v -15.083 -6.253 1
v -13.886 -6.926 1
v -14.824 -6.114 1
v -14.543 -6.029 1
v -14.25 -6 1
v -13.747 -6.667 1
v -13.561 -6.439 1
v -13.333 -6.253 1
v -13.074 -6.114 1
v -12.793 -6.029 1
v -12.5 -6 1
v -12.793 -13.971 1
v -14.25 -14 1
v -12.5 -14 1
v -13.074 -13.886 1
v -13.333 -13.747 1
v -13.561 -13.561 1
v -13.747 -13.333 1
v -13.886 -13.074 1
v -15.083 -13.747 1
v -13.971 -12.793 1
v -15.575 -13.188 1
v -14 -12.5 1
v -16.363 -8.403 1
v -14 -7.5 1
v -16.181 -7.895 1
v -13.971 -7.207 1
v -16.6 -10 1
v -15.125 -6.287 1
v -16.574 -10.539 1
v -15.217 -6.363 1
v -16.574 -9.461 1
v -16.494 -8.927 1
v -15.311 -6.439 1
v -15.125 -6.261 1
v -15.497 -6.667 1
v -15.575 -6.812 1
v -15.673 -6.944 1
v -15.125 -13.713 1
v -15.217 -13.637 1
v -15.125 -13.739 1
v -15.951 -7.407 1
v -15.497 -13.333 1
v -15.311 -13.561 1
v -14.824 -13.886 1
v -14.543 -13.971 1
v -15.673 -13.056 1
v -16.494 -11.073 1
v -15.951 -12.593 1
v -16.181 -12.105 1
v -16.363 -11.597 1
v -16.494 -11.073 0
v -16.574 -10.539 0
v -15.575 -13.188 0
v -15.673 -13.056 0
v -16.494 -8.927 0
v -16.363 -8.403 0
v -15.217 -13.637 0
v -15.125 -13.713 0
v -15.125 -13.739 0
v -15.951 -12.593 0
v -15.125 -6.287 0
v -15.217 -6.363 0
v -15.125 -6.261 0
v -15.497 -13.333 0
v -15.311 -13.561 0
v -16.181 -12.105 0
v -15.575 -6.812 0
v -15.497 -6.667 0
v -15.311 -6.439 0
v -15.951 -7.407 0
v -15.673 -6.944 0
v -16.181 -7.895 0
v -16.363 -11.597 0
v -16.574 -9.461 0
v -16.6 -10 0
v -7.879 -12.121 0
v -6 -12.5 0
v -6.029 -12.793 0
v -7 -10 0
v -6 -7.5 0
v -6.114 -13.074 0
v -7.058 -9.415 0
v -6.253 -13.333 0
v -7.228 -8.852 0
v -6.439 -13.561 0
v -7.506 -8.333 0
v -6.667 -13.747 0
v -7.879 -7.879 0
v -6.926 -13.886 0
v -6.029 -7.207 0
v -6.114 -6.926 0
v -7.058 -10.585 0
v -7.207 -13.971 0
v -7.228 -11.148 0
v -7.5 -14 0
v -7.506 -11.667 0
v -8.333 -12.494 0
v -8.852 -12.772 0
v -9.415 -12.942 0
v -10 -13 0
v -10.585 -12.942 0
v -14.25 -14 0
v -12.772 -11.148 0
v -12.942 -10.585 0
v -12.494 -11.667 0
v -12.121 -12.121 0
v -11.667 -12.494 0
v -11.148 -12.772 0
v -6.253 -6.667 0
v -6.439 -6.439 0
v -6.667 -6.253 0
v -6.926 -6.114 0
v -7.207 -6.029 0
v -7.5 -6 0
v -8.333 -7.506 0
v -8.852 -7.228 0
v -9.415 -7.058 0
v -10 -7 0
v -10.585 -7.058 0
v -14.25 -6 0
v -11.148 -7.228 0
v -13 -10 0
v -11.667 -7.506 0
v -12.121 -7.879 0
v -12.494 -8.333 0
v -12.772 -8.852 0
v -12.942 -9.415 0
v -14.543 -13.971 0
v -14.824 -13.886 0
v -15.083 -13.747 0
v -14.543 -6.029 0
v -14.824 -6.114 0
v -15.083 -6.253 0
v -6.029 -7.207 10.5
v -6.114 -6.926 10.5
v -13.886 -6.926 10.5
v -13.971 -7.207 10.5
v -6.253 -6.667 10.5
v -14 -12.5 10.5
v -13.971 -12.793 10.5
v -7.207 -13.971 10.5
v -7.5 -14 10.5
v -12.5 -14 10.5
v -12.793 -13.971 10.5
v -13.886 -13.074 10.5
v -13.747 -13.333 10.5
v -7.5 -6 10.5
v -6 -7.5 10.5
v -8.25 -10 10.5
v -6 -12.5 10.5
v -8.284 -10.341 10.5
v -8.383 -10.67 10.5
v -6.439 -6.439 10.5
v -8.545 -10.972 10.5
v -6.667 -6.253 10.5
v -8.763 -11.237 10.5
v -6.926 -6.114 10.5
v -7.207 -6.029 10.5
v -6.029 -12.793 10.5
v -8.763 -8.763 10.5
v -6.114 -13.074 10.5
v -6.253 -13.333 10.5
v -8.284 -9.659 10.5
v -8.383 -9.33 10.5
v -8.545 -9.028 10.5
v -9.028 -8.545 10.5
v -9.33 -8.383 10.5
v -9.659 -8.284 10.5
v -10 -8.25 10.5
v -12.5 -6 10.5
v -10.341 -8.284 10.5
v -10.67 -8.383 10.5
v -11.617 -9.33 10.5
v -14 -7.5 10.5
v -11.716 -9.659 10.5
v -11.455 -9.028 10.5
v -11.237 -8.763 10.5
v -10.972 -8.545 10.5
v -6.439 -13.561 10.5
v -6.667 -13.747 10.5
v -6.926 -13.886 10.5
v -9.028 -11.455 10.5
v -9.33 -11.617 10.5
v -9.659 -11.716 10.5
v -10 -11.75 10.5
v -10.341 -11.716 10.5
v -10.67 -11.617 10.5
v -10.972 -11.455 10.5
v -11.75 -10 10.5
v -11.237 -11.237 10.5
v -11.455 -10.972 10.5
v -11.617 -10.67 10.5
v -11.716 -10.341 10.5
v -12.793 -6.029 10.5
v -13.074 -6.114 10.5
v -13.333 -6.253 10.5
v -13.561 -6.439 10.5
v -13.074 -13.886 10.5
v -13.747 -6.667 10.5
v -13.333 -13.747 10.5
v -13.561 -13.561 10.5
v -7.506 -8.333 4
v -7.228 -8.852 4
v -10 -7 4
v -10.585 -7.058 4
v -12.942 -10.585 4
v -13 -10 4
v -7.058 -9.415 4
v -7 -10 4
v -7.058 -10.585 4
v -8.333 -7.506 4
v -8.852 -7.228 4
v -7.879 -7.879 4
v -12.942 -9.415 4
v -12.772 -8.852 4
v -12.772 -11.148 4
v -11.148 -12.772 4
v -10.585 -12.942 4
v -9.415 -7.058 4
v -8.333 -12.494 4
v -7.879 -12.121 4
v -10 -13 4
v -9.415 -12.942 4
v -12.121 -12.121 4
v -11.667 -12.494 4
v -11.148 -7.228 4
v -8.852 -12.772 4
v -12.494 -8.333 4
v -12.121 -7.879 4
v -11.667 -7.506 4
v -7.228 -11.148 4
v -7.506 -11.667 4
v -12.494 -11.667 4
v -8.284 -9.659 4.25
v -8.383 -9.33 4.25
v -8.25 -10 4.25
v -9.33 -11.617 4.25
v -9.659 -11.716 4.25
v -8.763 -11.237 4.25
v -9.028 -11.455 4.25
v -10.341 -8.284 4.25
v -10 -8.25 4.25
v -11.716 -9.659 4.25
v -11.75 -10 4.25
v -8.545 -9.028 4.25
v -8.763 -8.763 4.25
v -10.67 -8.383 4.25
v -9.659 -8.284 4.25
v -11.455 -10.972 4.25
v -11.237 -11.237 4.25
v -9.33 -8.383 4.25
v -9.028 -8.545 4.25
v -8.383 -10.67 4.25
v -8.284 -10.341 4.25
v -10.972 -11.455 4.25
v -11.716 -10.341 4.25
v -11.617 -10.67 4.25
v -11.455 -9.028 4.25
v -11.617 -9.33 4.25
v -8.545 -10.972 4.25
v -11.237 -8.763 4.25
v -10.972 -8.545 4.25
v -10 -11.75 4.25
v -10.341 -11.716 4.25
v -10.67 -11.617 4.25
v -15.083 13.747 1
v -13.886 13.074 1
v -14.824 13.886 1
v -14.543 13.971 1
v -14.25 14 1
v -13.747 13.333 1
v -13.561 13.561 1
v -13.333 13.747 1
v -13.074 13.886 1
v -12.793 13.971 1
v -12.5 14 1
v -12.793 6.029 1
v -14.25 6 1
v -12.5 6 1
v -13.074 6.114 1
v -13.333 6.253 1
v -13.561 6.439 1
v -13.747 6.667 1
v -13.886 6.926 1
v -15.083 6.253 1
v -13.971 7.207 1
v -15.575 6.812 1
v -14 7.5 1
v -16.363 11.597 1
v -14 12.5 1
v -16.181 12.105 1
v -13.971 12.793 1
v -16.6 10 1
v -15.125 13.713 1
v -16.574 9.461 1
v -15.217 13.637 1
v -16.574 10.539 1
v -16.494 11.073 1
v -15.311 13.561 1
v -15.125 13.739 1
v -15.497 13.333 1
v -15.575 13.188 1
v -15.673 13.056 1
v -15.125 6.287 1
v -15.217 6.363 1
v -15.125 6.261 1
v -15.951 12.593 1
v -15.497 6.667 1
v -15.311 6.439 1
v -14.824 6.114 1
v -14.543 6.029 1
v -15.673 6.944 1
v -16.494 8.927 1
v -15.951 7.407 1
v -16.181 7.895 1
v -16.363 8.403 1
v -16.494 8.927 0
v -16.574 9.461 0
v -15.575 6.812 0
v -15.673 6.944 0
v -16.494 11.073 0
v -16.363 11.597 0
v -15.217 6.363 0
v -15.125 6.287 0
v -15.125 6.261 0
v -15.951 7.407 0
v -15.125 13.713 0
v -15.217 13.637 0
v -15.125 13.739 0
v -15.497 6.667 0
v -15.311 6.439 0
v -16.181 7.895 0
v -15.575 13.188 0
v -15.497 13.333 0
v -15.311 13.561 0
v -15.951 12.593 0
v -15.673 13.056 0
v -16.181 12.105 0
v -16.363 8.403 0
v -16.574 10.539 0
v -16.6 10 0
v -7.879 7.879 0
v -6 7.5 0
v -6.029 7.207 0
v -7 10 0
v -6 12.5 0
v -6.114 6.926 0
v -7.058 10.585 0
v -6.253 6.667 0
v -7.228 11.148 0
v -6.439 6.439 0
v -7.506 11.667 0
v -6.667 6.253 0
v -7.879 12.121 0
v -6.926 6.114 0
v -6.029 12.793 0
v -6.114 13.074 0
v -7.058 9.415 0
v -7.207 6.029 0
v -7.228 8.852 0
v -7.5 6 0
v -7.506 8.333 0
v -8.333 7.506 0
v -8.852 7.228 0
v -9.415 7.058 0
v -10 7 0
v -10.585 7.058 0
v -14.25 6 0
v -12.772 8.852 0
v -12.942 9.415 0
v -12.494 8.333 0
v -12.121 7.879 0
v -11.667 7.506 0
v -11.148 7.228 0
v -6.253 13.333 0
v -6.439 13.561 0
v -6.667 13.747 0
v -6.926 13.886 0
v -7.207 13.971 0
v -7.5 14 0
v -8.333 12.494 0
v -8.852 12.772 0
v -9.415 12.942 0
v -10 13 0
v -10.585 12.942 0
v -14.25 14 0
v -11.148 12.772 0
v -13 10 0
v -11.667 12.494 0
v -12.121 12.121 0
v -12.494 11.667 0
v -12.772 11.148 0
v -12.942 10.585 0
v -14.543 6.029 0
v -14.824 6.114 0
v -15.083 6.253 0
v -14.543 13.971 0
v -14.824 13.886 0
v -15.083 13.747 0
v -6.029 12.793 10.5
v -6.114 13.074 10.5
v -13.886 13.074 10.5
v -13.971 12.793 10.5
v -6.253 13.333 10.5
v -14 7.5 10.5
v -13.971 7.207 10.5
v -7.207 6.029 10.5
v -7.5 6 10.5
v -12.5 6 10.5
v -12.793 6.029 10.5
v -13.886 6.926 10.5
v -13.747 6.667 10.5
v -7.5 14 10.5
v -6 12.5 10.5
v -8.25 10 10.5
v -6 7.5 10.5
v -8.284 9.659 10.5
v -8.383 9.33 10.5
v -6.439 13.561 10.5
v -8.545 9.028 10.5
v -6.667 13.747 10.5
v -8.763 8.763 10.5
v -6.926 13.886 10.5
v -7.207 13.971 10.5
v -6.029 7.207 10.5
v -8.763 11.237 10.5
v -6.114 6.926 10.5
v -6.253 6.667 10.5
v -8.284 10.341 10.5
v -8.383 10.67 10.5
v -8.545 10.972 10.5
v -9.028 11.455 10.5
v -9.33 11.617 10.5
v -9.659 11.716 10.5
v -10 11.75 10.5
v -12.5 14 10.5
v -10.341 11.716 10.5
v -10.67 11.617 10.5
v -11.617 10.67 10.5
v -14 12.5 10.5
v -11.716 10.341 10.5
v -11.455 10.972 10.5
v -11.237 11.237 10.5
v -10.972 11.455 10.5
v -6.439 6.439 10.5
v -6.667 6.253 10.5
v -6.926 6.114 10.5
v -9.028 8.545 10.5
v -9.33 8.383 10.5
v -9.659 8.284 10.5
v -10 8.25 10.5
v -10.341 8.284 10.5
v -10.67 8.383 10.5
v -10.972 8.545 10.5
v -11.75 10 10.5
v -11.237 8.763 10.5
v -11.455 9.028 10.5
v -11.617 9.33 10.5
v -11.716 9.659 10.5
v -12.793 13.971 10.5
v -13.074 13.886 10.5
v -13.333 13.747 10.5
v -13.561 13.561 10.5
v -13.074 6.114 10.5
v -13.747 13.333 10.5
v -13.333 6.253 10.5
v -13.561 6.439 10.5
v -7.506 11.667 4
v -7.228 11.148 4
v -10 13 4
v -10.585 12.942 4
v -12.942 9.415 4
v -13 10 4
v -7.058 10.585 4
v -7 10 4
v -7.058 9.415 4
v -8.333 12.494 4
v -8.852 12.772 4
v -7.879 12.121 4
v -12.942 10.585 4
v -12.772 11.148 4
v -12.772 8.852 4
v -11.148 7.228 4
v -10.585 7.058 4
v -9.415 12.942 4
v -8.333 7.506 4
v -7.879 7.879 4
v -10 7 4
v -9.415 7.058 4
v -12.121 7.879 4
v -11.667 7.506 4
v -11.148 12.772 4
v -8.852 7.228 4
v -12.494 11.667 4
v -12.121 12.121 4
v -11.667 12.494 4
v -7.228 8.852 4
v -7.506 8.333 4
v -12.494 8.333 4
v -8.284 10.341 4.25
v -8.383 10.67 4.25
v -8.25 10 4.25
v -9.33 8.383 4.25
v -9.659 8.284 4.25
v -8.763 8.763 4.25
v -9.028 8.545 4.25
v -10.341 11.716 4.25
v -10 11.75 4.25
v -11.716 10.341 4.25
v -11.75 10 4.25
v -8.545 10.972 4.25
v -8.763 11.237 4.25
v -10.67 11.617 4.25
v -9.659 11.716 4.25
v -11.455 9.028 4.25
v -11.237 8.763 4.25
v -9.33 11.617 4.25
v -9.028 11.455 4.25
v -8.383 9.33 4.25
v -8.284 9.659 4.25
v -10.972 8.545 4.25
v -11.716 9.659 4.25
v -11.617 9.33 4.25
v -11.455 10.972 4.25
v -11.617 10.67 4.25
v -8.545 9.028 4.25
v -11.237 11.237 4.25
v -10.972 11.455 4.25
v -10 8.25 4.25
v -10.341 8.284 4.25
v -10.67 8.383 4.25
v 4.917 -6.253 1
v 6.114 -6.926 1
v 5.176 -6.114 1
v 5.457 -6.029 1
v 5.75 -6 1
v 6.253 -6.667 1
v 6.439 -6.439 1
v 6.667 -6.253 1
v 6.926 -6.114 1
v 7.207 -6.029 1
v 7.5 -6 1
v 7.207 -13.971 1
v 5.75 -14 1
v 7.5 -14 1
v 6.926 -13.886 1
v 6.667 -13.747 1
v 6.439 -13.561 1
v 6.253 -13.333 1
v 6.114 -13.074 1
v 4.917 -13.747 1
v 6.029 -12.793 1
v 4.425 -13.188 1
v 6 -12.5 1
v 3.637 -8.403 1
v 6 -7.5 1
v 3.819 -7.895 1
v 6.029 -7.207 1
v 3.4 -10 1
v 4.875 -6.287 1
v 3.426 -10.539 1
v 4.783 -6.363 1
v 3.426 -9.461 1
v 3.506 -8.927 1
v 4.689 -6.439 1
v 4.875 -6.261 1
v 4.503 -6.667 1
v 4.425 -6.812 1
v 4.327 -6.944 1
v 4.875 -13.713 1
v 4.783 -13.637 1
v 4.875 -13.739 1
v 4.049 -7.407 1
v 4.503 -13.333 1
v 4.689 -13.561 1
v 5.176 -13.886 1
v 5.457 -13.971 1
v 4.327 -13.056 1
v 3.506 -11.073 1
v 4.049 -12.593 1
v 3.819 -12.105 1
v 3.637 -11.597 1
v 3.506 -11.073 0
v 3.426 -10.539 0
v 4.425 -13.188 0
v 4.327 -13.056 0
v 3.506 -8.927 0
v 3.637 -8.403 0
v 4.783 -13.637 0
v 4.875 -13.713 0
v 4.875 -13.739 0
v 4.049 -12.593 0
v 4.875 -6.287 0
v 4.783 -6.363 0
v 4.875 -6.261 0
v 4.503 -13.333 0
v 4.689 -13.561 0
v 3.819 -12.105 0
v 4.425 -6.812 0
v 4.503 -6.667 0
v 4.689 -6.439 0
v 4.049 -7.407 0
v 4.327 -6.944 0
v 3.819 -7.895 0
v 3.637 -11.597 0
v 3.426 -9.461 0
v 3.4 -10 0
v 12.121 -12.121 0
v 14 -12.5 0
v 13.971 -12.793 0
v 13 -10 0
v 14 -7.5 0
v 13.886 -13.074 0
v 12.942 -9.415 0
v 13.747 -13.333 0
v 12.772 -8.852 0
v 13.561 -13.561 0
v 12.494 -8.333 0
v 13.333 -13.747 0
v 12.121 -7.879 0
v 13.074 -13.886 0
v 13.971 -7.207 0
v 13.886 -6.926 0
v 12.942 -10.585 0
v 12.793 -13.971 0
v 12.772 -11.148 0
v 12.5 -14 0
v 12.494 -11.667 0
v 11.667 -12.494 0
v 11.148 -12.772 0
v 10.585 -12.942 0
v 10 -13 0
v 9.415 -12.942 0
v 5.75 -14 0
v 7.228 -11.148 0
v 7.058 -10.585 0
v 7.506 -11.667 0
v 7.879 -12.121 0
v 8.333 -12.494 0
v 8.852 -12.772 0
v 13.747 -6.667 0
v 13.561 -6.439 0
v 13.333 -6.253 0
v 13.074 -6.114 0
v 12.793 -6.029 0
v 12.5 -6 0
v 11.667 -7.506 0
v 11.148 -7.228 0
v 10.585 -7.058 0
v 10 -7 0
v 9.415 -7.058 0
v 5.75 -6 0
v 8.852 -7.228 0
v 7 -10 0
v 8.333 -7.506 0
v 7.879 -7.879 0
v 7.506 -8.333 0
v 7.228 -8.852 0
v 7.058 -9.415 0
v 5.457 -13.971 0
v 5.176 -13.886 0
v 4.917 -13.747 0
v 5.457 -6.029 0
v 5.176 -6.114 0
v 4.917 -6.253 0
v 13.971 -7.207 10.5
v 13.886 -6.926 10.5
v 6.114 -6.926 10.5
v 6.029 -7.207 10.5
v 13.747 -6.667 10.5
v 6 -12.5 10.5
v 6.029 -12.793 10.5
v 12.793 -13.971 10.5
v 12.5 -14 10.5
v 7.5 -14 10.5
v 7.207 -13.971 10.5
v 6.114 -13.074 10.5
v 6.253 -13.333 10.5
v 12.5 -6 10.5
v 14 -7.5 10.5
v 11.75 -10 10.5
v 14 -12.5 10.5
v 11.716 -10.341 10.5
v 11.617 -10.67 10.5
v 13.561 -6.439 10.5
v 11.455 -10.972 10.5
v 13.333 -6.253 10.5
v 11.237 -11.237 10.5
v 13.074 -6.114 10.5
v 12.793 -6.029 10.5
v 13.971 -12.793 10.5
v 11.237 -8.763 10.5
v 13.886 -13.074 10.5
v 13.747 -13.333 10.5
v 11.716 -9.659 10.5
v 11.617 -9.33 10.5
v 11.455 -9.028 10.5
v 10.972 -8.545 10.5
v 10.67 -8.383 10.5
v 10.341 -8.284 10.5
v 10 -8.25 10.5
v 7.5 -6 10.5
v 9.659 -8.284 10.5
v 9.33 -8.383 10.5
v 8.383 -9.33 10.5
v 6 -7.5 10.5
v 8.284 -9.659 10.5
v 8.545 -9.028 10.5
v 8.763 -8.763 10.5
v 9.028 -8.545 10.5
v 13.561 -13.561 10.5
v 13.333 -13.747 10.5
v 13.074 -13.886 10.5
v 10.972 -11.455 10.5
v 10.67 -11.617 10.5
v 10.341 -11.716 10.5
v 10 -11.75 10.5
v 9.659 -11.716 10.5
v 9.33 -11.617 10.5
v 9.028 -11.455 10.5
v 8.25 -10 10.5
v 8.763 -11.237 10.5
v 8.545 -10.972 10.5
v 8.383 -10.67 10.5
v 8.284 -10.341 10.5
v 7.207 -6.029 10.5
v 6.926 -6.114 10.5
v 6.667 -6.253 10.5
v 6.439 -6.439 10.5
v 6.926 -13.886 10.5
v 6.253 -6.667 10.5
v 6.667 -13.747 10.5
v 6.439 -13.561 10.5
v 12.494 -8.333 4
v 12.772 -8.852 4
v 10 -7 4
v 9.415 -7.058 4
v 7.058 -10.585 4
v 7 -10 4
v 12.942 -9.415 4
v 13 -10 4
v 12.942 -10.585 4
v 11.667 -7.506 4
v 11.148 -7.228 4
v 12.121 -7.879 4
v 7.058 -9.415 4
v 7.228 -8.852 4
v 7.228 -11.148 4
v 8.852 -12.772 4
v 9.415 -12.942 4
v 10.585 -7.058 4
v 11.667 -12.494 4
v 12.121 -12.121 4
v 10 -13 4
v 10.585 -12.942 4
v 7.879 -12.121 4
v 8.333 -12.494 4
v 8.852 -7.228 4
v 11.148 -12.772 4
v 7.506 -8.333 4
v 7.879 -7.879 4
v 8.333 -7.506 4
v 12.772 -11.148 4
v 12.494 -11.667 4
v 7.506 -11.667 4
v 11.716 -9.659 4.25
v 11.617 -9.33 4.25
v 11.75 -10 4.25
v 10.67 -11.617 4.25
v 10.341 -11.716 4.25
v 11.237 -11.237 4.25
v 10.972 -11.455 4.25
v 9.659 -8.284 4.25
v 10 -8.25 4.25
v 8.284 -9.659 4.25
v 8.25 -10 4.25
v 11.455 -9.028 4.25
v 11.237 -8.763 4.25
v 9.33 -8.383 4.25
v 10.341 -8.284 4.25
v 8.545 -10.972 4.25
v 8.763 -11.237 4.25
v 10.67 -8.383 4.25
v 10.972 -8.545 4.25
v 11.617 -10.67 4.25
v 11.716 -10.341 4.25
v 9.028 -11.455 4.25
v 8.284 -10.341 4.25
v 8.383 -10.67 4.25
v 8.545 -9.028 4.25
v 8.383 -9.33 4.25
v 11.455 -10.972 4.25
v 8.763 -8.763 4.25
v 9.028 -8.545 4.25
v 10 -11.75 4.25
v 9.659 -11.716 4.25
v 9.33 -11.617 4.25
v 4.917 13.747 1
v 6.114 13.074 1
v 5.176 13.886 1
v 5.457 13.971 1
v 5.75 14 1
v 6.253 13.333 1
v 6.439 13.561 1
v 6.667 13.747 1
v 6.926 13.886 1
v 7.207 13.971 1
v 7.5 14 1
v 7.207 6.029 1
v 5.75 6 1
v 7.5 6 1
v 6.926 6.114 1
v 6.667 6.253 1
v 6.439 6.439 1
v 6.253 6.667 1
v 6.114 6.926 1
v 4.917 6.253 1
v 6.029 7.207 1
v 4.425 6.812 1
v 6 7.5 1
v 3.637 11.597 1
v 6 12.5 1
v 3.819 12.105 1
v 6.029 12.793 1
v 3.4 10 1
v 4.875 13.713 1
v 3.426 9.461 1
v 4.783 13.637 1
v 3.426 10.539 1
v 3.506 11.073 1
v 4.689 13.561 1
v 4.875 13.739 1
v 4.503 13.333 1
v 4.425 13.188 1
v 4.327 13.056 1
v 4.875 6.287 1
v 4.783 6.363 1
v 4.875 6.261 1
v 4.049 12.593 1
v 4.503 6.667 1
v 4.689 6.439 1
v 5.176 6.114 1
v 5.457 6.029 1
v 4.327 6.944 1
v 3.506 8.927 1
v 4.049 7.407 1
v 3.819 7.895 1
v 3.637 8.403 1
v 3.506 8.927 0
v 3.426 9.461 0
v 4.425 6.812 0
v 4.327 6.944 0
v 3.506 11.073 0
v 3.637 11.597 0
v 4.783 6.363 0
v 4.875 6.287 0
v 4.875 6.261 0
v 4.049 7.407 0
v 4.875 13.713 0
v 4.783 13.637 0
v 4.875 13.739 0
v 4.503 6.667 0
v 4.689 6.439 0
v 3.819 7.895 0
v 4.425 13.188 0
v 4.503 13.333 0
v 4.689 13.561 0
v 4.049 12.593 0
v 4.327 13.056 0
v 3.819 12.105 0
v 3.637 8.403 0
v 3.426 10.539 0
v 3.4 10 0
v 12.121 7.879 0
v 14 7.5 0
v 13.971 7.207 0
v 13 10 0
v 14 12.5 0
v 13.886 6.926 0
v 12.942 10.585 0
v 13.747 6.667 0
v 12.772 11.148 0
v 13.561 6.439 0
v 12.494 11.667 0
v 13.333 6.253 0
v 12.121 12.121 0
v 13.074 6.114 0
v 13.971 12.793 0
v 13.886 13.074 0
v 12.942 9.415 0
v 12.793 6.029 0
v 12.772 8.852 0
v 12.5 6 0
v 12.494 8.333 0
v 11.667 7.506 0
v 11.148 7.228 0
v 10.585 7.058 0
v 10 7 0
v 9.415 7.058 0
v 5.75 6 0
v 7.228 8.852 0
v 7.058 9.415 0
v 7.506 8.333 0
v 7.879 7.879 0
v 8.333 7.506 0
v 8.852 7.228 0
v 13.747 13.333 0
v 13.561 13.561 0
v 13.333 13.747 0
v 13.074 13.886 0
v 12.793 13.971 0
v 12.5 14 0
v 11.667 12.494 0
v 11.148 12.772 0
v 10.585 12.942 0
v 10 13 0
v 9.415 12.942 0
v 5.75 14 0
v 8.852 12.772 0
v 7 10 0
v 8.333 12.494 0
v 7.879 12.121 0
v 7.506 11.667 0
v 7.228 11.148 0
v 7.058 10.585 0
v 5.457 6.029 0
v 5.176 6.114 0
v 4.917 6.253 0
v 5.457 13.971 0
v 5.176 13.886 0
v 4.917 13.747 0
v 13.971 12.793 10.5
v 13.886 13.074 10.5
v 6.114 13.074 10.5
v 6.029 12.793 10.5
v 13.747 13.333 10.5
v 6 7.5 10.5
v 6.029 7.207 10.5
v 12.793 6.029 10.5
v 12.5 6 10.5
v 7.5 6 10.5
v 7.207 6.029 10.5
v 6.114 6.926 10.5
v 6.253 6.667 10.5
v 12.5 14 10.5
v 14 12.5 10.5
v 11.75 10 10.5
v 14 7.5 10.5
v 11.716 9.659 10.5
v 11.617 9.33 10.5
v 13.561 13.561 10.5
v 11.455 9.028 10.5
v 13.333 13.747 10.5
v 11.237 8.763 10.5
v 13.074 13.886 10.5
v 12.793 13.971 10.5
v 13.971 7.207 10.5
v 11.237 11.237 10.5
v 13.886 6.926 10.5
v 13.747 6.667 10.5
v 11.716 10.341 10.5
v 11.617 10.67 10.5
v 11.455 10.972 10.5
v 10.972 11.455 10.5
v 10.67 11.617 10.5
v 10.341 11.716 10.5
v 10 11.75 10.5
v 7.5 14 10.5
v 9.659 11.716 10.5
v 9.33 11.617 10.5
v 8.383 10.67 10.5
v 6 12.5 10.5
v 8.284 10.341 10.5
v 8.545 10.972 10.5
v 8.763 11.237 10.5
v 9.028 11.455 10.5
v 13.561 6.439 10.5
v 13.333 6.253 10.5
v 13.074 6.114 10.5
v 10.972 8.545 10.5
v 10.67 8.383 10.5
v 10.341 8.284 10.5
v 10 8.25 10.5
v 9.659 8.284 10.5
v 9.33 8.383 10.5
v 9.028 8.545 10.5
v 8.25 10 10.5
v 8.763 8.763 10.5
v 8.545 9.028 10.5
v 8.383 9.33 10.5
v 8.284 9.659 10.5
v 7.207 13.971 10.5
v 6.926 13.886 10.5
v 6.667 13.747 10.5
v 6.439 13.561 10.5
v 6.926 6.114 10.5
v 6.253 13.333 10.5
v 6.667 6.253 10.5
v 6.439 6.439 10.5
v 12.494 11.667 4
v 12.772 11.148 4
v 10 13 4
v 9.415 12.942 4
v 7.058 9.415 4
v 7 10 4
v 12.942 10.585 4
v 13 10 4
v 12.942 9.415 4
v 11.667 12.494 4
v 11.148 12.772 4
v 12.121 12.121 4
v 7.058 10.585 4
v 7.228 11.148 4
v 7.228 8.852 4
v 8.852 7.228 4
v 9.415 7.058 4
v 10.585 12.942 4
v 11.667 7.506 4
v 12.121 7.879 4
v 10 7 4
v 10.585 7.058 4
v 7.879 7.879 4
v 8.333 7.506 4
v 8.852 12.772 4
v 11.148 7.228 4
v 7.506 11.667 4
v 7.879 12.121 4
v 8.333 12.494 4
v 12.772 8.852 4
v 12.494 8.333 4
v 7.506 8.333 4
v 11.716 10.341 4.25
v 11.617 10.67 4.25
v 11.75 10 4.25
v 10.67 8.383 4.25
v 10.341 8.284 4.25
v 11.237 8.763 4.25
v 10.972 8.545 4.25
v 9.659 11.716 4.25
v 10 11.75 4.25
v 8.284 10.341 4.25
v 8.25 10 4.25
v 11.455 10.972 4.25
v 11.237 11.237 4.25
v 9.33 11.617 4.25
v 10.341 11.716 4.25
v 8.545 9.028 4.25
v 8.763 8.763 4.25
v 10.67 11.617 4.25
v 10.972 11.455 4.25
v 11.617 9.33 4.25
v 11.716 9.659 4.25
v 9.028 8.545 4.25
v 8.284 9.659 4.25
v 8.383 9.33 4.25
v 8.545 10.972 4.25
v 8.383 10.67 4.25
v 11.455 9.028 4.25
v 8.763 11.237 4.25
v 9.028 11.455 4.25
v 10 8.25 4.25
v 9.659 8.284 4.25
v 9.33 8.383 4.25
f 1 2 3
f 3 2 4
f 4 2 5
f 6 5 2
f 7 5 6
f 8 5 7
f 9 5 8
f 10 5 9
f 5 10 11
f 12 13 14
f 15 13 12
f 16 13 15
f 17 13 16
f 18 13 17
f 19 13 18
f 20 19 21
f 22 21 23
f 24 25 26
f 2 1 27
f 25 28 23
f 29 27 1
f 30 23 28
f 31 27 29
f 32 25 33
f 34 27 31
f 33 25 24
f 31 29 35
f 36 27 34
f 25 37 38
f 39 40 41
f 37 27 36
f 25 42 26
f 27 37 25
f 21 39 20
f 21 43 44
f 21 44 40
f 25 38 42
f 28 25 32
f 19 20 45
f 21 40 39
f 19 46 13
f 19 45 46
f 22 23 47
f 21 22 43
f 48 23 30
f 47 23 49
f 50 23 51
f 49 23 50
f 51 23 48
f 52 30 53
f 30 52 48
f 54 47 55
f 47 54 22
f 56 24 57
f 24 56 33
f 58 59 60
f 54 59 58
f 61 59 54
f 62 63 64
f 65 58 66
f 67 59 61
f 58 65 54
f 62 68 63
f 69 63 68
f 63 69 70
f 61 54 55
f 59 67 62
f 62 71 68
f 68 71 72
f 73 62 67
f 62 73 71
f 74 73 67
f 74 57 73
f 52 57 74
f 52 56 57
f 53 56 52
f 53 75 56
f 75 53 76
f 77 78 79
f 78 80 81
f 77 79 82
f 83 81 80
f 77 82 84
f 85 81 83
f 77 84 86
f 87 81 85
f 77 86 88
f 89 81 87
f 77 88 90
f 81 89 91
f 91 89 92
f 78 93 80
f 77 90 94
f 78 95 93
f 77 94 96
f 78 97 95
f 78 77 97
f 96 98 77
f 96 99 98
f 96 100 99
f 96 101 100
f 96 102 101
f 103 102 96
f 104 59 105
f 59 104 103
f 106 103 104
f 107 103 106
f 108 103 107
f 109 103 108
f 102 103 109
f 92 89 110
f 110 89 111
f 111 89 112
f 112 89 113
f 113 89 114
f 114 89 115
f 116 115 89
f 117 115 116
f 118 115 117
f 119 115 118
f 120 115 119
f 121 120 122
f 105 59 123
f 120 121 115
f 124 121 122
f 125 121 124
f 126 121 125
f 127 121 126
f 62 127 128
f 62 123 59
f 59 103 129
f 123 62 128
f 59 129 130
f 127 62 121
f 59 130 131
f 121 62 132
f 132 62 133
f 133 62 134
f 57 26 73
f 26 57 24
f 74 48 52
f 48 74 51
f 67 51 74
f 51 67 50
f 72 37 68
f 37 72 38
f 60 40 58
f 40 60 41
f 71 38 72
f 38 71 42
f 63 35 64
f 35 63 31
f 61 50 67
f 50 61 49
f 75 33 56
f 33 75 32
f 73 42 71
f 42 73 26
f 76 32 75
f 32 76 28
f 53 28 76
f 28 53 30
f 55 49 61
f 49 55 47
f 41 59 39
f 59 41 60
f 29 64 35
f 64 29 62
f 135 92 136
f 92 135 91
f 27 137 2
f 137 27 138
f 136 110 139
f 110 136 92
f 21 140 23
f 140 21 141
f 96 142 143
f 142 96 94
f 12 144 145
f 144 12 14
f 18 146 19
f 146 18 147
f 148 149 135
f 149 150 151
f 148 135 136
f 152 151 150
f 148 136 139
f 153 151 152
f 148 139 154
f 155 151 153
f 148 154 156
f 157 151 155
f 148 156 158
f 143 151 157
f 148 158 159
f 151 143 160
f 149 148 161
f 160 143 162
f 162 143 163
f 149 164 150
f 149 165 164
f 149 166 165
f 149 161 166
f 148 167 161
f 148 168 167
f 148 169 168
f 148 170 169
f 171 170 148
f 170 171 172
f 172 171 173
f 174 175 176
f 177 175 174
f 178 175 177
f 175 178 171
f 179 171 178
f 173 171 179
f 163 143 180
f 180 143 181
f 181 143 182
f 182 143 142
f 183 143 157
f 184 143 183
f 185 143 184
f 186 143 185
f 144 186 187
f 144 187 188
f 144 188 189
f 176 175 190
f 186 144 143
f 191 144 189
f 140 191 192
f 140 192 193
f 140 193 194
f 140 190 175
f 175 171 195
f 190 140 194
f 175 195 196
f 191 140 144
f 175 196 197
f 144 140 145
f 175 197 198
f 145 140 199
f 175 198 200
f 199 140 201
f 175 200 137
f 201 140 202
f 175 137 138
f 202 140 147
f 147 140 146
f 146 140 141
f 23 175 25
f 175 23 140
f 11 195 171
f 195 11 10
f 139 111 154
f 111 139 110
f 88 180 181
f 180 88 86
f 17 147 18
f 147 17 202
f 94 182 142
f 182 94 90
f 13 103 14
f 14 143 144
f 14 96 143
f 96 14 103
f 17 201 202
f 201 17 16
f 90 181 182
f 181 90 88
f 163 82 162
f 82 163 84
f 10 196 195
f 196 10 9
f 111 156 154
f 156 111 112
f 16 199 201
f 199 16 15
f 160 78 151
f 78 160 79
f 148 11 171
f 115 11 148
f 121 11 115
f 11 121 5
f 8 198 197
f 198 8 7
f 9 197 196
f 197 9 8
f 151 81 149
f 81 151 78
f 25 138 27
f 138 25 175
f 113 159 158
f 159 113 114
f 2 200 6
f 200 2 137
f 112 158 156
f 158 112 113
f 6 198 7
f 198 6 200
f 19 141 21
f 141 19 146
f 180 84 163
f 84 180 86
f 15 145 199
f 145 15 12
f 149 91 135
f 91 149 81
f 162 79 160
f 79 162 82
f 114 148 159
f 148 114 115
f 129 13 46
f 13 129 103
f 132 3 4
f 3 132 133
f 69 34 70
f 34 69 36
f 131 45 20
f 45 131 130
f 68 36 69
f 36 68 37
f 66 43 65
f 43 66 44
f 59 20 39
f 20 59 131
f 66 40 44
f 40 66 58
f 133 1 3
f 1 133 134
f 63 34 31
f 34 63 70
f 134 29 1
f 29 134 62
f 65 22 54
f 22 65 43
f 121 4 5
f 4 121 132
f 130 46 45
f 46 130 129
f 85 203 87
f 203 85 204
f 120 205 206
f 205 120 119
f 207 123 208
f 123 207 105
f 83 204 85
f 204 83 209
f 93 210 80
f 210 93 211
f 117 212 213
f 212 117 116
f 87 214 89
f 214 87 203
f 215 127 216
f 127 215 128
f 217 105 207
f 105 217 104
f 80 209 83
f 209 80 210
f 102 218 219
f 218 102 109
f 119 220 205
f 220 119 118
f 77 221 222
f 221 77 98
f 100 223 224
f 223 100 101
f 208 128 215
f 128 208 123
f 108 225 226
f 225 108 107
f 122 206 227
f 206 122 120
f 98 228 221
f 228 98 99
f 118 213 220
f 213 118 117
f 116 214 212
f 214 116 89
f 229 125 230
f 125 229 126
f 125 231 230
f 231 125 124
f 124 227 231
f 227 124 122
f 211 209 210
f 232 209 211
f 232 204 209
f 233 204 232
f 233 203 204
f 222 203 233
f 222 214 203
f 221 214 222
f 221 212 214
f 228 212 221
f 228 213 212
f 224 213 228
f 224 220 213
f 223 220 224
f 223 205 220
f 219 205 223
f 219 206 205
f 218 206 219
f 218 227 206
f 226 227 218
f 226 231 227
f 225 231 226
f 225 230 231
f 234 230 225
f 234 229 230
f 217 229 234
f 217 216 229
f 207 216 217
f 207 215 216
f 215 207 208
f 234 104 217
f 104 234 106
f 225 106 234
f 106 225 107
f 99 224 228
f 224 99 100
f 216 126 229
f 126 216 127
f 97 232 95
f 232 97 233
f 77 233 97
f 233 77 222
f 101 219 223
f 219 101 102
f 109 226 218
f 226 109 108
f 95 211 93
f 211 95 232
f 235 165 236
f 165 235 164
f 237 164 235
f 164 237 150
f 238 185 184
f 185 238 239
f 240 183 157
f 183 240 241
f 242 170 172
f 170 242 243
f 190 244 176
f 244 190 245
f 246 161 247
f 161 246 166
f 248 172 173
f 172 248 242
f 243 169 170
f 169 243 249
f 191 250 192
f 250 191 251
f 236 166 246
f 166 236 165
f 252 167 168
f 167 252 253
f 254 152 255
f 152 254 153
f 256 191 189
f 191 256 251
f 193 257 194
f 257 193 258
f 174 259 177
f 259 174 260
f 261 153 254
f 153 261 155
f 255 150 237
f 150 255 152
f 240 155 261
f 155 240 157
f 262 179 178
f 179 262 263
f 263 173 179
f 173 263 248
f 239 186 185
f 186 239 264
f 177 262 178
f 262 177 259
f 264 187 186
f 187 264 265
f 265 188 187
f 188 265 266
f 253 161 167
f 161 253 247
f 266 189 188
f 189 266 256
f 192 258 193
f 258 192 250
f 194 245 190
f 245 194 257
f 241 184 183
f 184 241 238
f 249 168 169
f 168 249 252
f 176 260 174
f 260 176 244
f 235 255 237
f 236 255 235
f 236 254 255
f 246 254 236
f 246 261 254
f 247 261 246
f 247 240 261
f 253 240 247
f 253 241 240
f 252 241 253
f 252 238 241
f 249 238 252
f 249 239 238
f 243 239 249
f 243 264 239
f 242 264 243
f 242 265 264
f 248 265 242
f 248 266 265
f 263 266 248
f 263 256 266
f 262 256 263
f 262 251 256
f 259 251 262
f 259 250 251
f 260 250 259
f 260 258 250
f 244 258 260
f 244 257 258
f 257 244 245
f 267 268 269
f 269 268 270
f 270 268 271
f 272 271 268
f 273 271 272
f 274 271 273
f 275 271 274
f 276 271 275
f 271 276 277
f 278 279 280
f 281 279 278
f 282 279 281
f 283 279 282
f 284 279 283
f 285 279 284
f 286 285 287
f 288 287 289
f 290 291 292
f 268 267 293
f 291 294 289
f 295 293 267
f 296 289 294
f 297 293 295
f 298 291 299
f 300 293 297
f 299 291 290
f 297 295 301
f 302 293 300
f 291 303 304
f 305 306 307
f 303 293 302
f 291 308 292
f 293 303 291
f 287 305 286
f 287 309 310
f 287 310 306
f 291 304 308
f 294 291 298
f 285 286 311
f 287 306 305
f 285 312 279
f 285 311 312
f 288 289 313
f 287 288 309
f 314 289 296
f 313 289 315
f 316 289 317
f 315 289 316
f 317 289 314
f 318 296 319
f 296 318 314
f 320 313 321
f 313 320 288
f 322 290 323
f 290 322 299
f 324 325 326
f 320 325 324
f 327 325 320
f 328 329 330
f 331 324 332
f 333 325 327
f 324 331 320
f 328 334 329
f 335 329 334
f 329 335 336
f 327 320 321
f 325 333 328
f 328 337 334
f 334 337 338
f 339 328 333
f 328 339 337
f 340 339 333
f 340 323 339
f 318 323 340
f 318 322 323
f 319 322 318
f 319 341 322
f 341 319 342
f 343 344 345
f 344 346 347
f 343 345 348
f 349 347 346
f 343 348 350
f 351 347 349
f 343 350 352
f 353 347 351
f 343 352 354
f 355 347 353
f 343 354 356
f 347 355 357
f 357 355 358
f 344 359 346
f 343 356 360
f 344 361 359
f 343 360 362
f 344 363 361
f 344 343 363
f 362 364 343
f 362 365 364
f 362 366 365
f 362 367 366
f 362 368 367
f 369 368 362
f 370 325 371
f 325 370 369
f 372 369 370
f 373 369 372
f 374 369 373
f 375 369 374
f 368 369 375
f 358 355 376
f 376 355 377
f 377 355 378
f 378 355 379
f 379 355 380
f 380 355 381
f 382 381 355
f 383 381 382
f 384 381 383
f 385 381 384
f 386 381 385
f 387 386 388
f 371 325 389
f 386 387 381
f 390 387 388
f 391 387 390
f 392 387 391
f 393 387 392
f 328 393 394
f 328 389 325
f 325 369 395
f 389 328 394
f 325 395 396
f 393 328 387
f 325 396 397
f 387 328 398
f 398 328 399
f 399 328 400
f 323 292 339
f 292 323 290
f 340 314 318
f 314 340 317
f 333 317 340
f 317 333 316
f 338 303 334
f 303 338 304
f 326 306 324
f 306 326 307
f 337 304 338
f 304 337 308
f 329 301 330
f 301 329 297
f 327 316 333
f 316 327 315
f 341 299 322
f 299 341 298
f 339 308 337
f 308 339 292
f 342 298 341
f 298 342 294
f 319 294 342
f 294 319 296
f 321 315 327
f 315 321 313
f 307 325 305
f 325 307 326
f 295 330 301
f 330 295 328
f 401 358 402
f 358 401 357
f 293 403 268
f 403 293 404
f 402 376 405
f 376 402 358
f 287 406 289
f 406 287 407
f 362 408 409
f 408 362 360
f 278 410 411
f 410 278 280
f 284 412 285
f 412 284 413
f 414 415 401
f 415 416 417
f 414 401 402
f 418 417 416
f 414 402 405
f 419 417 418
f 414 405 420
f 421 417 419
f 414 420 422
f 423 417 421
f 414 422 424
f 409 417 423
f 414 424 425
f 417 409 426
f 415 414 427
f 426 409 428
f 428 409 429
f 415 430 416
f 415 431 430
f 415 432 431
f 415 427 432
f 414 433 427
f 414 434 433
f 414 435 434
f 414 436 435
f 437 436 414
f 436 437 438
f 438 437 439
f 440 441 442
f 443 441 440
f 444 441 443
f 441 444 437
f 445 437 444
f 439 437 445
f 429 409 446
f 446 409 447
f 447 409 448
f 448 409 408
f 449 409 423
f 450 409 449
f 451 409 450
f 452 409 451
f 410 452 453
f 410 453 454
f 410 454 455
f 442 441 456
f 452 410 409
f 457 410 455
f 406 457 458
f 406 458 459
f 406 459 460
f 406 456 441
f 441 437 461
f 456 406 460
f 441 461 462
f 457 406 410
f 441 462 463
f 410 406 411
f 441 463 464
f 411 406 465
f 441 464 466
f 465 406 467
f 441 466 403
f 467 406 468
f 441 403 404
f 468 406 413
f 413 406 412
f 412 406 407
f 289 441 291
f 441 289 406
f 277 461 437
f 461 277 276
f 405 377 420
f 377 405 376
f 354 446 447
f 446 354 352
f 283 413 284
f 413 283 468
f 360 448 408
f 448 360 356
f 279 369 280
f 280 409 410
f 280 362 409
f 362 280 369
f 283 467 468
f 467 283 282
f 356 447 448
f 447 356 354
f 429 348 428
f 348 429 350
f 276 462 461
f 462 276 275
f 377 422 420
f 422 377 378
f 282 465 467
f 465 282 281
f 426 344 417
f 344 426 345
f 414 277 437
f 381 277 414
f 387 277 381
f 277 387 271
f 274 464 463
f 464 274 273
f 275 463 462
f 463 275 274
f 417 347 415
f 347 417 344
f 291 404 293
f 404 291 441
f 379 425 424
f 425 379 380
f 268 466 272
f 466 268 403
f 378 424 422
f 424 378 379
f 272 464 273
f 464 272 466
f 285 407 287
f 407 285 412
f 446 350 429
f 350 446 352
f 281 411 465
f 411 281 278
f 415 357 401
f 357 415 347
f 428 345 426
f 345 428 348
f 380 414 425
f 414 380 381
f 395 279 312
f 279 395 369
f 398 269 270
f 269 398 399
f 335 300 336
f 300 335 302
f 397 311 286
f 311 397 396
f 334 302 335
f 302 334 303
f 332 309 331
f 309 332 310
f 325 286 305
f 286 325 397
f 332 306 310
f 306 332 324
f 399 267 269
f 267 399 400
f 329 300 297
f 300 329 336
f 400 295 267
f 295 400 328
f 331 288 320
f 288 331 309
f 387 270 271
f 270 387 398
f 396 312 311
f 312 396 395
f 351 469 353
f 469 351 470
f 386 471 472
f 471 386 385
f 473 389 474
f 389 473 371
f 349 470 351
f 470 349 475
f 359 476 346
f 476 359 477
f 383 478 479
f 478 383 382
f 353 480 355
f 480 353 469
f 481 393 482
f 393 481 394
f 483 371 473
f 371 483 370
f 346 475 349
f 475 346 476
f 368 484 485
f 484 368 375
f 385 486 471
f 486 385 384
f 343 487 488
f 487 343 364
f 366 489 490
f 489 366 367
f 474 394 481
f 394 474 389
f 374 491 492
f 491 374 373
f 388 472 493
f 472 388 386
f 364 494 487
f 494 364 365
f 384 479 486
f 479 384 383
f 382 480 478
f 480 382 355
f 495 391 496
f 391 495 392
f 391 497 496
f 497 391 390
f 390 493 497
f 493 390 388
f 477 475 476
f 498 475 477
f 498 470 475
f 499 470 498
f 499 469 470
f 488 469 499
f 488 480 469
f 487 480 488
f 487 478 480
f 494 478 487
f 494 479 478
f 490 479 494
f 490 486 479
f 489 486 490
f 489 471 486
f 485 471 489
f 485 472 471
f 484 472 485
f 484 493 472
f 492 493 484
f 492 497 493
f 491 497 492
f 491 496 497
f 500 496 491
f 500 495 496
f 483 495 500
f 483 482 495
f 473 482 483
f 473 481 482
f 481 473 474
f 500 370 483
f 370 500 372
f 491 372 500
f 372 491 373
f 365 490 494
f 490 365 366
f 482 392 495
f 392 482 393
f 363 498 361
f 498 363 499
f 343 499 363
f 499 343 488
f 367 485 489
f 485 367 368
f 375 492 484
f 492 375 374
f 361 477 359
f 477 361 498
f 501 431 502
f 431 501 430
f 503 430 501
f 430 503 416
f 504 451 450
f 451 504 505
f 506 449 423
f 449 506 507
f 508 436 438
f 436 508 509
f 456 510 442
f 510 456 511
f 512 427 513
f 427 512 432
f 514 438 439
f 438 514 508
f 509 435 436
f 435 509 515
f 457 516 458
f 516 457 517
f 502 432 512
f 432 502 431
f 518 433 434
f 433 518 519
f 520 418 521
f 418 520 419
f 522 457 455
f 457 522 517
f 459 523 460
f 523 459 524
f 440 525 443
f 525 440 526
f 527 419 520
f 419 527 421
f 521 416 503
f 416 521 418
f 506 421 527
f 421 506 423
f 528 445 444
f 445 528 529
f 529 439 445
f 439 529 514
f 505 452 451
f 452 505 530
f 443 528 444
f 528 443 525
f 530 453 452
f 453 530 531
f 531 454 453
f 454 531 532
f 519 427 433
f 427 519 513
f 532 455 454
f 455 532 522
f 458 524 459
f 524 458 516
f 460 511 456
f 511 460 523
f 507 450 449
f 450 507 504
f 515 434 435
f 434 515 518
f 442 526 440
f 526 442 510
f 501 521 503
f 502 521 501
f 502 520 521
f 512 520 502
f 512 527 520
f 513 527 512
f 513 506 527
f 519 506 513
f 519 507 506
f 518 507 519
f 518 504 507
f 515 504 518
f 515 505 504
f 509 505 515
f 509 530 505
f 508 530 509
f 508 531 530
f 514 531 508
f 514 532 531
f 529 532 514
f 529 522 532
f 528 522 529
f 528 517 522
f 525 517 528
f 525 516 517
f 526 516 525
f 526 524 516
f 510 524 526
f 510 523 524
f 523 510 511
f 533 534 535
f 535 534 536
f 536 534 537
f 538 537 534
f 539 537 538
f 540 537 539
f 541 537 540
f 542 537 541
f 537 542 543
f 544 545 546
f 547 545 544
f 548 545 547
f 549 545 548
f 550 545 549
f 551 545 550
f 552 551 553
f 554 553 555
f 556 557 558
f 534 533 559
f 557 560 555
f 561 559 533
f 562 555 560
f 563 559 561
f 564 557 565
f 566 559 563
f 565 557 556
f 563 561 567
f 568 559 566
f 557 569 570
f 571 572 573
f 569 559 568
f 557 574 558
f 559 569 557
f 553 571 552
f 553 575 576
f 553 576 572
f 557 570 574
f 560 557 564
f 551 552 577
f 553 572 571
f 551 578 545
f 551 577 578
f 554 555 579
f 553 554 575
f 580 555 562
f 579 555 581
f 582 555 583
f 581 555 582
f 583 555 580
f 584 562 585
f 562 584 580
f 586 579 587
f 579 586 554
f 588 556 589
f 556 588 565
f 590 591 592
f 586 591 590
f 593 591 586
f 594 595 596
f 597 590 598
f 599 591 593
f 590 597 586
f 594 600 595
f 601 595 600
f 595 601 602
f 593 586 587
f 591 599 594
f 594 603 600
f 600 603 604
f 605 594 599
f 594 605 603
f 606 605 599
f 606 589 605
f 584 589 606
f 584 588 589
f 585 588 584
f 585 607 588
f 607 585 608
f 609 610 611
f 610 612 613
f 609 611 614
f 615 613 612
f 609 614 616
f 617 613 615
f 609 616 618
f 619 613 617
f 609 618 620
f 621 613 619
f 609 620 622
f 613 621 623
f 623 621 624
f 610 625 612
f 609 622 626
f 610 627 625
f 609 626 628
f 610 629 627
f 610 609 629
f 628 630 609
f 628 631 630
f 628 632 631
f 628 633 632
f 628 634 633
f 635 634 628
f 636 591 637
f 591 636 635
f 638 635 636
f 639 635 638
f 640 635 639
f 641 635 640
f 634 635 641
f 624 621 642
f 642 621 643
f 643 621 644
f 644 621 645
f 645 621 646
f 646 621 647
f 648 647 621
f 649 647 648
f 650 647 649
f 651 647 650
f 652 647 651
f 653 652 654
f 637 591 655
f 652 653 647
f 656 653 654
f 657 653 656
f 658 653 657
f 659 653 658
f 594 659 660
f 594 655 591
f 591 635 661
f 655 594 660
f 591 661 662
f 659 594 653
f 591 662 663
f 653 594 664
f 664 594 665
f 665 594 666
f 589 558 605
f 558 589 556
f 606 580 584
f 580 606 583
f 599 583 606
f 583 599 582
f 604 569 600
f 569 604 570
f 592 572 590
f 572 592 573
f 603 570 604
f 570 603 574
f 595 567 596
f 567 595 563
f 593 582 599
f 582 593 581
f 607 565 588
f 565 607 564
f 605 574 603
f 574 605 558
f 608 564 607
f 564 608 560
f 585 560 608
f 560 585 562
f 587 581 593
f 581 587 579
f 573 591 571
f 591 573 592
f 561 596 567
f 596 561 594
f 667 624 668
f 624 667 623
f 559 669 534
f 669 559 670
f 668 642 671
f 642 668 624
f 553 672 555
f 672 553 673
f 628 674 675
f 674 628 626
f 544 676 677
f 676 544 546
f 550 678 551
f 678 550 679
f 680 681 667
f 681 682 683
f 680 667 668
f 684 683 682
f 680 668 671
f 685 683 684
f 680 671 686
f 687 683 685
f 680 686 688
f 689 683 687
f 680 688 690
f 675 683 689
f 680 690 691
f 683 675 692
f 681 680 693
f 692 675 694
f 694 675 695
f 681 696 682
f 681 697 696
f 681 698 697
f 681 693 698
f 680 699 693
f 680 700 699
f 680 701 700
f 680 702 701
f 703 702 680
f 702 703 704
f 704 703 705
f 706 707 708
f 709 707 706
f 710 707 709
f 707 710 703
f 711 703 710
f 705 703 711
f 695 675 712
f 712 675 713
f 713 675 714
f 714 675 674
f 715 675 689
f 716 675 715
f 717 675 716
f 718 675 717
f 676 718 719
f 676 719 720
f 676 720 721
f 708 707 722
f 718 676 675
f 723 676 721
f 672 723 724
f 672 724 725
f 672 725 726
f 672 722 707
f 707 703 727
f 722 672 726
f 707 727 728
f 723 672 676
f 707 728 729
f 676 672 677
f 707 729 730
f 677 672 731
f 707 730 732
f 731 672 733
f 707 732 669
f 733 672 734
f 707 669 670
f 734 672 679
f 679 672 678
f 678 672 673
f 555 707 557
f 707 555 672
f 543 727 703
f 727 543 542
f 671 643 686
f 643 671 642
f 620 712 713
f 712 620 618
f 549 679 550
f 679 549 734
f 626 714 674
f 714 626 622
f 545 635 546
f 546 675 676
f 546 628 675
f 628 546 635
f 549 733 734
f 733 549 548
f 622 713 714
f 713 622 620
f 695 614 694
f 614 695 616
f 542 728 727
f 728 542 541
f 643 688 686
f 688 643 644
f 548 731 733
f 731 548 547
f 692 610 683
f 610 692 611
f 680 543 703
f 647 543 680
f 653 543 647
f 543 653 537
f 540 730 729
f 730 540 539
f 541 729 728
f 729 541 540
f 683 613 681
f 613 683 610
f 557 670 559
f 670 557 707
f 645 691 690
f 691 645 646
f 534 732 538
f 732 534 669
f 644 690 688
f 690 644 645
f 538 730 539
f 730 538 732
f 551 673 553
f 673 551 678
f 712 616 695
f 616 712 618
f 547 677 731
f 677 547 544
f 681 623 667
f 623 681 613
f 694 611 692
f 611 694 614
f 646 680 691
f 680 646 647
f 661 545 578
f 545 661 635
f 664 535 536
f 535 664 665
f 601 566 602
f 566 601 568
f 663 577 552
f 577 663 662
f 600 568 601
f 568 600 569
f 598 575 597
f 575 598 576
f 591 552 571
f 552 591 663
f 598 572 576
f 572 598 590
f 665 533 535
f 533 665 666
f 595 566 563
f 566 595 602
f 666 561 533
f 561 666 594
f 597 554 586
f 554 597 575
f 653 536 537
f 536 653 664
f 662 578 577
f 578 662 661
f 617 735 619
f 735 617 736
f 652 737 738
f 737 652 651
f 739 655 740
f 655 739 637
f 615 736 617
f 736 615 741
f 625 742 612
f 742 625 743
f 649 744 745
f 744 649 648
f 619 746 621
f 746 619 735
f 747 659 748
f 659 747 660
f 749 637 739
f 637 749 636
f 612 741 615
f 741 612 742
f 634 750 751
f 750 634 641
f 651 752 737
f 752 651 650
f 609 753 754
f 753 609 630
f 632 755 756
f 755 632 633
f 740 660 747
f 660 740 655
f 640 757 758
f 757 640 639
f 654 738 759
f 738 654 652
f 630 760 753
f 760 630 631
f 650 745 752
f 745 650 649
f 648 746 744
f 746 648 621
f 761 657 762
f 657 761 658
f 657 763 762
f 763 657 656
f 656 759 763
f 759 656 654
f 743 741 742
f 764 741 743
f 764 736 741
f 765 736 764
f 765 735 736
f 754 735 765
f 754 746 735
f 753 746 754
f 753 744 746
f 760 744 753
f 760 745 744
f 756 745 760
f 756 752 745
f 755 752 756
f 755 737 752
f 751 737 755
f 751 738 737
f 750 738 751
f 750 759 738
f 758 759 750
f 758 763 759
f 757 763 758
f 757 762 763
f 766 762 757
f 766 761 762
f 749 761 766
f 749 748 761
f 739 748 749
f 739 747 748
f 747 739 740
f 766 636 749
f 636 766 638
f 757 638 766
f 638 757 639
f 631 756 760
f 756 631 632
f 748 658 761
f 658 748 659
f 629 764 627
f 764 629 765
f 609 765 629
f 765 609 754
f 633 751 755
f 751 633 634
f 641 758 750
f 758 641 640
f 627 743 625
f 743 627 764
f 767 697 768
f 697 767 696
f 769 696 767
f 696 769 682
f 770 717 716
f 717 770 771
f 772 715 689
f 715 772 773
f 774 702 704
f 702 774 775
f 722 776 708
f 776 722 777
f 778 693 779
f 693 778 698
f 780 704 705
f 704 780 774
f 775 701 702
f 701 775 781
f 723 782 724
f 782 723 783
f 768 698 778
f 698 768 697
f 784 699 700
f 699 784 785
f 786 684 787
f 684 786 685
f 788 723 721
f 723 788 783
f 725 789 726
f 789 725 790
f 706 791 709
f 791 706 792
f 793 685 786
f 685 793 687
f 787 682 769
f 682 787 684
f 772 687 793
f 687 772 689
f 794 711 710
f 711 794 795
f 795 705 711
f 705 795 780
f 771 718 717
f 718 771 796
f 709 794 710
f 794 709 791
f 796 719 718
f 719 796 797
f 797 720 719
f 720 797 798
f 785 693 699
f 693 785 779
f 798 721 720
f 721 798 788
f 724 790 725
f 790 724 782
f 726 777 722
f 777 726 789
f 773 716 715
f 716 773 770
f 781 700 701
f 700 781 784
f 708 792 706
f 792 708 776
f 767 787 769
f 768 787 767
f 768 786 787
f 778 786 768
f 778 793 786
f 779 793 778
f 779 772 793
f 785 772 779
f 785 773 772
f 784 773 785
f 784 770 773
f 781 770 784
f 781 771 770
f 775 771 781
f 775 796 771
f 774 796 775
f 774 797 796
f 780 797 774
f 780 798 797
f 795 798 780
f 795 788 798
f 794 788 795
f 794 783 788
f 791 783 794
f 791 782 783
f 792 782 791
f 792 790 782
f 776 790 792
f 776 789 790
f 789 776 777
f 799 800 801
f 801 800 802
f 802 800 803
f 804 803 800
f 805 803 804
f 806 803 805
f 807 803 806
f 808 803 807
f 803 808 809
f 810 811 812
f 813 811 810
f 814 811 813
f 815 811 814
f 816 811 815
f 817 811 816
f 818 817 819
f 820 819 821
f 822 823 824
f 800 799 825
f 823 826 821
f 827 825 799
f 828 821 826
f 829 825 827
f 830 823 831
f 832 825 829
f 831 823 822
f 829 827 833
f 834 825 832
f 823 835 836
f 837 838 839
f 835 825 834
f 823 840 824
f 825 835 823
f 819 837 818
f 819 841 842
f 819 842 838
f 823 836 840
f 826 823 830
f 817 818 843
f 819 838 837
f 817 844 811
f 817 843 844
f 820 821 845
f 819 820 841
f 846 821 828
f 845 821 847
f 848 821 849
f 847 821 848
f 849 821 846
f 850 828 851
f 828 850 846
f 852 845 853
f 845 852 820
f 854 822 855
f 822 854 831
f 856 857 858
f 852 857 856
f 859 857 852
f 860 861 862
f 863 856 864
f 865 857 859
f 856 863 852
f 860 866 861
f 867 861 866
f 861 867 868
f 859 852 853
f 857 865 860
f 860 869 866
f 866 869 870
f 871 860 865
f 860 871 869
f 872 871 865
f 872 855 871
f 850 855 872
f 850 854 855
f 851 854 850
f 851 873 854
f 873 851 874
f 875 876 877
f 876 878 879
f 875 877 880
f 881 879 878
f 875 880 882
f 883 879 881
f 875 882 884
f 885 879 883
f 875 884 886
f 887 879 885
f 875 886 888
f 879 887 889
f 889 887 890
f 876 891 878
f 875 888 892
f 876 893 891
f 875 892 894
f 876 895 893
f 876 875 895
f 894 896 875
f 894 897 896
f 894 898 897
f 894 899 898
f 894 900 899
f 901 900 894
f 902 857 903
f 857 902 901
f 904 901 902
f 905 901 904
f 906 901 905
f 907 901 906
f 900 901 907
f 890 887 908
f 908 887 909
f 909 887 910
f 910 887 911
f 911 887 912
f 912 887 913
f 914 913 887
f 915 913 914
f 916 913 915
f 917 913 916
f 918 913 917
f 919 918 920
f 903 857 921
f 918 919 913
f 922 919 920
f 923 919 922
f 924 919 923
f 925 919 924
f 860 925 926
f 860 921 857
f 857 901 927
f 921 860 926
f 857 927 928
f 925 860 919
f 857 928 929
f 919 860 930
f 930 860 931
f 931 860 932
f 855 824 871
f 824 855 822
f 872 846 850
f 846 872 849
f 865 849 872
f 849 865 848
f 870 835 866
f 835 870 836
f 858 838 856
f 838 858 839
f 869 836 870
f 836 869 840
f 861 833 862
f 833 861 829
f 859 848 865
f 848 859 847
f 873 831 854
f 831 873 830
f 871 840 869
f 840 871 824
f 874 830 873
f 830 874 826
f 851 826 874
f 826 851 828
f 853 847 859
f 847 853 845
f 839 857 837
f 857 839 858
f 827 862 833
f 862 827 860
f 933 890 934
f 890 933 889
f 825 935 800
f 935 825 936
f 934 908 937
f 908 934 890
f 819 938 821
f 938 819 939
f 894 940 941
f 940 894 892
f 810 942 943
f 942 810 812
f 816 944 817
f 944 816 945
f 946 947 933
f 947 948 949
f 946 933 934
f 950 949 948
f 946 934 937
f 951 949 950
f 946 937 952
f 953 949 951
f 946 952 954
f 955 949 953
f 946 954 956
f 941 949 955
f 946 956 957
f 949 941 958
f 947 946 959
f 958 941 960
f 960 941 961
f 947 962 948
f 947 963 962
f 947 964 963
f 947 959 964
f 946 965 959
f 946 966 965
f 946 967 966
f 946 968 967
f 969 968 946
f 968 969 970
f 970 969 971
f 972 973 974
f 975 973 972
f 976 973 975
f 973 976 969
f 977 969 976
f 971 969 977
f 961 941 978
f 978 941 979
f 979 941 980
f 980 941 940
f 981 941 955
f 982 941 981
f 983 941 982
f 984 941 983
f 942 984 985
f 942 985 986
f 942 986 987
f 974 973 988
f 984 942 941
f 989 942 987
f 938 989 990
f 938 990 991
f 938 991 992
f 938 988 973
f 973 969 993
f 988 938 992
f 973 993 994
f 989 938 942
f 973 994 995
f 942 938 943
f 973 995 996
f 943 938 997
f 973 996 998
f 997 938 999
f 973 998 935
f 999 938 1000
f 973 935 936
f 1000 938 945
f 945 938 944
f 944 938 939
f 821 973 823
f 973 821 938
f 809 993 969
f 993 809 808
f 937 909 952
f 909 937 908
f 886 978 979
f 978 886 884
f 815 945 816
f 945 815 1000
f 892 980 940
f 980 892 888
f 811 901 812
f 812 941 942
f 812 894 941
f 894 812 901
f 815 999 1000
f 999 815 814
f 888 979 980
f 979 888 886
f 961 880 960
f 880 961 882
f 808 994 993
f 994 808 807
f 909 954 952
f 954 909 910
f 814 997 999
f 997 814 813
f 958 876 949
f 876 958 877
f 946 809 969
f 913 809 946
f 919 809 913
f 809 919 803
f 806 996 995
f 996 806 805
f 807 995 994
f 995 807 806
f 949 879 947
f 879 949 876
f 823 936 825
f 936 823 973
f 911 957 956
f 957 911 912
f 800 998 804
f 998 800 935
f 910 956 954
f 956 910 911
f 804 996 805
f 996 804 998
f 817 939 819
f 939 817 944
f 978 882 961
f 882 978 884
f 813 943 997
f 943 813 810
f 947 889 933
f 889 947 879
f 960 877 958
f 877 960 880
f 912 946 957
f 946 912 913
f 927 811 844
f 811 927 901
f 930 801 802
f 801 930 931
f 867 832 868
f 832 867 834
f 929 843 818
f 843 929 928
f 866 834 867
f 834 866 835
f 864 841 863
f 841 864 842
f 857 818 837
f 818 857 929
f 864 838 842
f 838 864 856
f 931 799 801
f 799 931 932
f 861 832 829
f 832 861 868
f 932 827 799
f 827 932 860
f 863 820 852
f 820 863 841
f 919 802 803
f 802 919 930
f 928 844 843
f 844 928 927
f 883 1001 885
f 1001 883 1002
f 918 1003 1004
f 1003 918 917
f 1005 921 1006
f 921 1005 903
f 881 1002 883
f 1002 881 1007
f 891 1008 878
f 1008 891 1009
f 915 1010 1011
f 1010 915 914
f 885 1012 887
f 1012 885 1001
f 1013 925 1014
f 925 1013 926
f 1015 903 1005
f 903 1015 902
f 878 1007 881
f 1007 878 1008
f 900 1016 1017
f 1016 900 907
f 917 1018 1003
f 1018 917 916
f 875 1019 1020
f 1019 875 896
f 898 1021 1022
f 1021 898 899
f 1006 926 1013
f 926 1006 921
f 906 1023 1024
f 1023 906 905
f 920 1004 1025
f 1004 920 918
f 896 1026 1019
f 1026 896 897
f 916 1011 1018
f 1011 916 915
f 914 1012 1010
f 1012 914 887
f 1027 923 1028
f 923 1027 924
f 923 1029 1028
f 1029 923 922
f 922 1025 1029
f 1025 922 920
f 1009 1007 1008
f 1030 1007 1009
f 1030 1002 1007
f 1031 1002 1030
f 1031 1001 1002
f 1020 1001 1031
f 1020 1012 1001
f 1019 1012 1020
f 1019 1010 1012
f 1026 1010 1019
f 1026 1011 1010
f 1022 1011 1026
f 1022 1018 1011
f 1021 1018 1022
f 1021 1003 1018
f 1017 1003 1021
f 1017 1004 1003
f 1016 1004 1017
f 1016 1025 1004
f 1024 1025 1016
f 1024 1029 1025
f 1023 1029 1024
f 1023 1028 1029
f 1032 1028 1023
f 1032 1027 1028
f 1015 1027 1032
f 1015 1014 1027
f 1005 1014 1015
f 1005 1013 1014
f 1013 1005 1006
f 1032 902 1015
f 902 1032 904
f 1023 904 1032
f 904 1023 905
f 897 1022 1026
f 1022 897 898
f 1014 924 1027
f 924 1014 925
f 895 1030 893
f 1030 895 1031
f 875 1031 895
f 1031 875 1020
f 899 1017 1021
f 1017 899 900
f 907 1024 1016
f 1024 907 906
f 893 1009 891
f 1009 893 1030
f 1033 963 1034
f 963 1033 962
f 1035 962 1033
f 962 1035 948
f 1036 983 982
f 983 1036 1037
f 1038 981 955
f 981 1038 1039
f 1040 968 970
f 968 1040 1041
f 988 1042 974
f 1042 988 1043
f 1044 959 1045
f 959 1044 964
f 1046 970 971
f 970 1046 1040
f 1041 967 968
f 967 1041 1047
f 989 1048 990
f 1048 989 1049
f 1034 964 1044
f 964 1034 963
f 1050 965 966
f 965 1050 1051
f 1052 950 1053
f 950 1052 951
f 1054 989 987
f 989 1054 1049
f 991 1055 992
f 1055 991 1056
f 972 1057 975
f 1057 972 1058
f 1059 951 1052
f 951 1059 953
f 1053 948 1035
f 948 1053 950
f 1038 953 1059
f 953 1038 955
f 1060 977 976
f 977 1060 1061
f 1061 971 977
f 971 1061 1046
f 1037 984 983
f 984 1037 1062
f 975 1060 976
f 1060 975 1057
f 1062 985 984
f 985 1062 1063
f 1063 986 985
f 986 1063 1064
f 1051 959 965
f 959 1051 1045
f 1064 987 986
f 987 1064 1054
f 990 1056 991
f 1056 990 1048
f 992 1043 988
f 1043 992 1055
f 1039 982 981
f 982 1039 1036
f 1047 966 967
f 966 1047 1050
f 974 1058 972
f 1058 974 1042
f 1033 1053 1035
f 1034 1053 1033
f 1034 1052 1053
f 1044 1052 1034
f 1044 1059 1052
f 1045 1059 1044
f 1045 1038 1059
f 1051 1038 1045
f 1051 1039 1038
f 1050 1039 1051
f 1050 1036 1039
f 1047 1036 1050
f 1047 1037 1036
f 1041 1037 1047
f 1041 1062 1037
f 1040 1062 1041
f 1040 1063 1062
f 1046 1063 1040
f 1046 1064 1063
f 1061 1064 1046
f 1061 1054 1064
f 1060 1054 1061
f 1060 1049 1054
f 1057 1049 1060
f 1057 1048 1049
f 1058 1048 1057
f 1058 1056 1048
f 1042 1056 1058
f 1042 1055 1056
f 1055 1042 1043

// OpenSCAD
for(x=[-10,10]) for(y=[-10,10]) translate([x,y,0]) 
bed_clip();

module bed_clip() difference() {
	union() {
		translate([0,0,10.5/4]) minkowski() {
			cube([5,5,10.5/2],center=true);
			cylinder(r=1.5,h=10.5/2,$fn=32);
		}
		translate([-2,0,1/2]) difference() {
			translate([1.15-0.25,0,0]) cylinder(r=5.5,h=1,$fn=64,center=true);
			translate([2.125,0,-0.25]) cube([10.5,12,5],center=true);
		}
		//%translate([-4.9,-7.75/2-0.125,0]) cube([7.75,7.75,10]);
		translate([-1.75,0,1/4]) minkowski() {
			cube([5,5,1/2],center=true);
			cylinder(r=1.5,h=1/2,$fn=32);
		}

	} 


	translate([0,0,-0.25]) cylinder(r=6/2,h=4.25,$fn=32);
	translate([0,0,4.25]) cylinder(r=3.5/2,h=6.5,$fn=32);
}






module old_bed_clip() difference() {
	union() {
		difference() {
			translate([-7,-5,0]) minkowski() {
				cube([10,10,3.5/2]);
				cylinder(r=1,h=3.5/2,$fn=24);
			}
			translate([-5,3,-0.25]) cylinder(r=1,h=4,$fn=24);
			translate([-6,-6.25,-0.25]) cube([3,9.25,4]);
		}
		translate([0,0,1.75]) minkowski() {
			cube([6,10,7/2],center=true);
			cylinder(r=1,h=7/2,$fn=24);
		}
	} 
	translate([0,0,-0.25]) cylinder(r=6/2,h=3.25,$fn=32);
	translate([0,0,3.25]) cylinder(r=3.5/2,h=5,$fn=32);

	translate([-7,-5,-0.25]) difference() {
		translate([0,-2,0]) cube([2,2,4]);
		translate([0,0,-0.25]) cylinder(r=1,h=4.5,$fn=24);
	}
}
